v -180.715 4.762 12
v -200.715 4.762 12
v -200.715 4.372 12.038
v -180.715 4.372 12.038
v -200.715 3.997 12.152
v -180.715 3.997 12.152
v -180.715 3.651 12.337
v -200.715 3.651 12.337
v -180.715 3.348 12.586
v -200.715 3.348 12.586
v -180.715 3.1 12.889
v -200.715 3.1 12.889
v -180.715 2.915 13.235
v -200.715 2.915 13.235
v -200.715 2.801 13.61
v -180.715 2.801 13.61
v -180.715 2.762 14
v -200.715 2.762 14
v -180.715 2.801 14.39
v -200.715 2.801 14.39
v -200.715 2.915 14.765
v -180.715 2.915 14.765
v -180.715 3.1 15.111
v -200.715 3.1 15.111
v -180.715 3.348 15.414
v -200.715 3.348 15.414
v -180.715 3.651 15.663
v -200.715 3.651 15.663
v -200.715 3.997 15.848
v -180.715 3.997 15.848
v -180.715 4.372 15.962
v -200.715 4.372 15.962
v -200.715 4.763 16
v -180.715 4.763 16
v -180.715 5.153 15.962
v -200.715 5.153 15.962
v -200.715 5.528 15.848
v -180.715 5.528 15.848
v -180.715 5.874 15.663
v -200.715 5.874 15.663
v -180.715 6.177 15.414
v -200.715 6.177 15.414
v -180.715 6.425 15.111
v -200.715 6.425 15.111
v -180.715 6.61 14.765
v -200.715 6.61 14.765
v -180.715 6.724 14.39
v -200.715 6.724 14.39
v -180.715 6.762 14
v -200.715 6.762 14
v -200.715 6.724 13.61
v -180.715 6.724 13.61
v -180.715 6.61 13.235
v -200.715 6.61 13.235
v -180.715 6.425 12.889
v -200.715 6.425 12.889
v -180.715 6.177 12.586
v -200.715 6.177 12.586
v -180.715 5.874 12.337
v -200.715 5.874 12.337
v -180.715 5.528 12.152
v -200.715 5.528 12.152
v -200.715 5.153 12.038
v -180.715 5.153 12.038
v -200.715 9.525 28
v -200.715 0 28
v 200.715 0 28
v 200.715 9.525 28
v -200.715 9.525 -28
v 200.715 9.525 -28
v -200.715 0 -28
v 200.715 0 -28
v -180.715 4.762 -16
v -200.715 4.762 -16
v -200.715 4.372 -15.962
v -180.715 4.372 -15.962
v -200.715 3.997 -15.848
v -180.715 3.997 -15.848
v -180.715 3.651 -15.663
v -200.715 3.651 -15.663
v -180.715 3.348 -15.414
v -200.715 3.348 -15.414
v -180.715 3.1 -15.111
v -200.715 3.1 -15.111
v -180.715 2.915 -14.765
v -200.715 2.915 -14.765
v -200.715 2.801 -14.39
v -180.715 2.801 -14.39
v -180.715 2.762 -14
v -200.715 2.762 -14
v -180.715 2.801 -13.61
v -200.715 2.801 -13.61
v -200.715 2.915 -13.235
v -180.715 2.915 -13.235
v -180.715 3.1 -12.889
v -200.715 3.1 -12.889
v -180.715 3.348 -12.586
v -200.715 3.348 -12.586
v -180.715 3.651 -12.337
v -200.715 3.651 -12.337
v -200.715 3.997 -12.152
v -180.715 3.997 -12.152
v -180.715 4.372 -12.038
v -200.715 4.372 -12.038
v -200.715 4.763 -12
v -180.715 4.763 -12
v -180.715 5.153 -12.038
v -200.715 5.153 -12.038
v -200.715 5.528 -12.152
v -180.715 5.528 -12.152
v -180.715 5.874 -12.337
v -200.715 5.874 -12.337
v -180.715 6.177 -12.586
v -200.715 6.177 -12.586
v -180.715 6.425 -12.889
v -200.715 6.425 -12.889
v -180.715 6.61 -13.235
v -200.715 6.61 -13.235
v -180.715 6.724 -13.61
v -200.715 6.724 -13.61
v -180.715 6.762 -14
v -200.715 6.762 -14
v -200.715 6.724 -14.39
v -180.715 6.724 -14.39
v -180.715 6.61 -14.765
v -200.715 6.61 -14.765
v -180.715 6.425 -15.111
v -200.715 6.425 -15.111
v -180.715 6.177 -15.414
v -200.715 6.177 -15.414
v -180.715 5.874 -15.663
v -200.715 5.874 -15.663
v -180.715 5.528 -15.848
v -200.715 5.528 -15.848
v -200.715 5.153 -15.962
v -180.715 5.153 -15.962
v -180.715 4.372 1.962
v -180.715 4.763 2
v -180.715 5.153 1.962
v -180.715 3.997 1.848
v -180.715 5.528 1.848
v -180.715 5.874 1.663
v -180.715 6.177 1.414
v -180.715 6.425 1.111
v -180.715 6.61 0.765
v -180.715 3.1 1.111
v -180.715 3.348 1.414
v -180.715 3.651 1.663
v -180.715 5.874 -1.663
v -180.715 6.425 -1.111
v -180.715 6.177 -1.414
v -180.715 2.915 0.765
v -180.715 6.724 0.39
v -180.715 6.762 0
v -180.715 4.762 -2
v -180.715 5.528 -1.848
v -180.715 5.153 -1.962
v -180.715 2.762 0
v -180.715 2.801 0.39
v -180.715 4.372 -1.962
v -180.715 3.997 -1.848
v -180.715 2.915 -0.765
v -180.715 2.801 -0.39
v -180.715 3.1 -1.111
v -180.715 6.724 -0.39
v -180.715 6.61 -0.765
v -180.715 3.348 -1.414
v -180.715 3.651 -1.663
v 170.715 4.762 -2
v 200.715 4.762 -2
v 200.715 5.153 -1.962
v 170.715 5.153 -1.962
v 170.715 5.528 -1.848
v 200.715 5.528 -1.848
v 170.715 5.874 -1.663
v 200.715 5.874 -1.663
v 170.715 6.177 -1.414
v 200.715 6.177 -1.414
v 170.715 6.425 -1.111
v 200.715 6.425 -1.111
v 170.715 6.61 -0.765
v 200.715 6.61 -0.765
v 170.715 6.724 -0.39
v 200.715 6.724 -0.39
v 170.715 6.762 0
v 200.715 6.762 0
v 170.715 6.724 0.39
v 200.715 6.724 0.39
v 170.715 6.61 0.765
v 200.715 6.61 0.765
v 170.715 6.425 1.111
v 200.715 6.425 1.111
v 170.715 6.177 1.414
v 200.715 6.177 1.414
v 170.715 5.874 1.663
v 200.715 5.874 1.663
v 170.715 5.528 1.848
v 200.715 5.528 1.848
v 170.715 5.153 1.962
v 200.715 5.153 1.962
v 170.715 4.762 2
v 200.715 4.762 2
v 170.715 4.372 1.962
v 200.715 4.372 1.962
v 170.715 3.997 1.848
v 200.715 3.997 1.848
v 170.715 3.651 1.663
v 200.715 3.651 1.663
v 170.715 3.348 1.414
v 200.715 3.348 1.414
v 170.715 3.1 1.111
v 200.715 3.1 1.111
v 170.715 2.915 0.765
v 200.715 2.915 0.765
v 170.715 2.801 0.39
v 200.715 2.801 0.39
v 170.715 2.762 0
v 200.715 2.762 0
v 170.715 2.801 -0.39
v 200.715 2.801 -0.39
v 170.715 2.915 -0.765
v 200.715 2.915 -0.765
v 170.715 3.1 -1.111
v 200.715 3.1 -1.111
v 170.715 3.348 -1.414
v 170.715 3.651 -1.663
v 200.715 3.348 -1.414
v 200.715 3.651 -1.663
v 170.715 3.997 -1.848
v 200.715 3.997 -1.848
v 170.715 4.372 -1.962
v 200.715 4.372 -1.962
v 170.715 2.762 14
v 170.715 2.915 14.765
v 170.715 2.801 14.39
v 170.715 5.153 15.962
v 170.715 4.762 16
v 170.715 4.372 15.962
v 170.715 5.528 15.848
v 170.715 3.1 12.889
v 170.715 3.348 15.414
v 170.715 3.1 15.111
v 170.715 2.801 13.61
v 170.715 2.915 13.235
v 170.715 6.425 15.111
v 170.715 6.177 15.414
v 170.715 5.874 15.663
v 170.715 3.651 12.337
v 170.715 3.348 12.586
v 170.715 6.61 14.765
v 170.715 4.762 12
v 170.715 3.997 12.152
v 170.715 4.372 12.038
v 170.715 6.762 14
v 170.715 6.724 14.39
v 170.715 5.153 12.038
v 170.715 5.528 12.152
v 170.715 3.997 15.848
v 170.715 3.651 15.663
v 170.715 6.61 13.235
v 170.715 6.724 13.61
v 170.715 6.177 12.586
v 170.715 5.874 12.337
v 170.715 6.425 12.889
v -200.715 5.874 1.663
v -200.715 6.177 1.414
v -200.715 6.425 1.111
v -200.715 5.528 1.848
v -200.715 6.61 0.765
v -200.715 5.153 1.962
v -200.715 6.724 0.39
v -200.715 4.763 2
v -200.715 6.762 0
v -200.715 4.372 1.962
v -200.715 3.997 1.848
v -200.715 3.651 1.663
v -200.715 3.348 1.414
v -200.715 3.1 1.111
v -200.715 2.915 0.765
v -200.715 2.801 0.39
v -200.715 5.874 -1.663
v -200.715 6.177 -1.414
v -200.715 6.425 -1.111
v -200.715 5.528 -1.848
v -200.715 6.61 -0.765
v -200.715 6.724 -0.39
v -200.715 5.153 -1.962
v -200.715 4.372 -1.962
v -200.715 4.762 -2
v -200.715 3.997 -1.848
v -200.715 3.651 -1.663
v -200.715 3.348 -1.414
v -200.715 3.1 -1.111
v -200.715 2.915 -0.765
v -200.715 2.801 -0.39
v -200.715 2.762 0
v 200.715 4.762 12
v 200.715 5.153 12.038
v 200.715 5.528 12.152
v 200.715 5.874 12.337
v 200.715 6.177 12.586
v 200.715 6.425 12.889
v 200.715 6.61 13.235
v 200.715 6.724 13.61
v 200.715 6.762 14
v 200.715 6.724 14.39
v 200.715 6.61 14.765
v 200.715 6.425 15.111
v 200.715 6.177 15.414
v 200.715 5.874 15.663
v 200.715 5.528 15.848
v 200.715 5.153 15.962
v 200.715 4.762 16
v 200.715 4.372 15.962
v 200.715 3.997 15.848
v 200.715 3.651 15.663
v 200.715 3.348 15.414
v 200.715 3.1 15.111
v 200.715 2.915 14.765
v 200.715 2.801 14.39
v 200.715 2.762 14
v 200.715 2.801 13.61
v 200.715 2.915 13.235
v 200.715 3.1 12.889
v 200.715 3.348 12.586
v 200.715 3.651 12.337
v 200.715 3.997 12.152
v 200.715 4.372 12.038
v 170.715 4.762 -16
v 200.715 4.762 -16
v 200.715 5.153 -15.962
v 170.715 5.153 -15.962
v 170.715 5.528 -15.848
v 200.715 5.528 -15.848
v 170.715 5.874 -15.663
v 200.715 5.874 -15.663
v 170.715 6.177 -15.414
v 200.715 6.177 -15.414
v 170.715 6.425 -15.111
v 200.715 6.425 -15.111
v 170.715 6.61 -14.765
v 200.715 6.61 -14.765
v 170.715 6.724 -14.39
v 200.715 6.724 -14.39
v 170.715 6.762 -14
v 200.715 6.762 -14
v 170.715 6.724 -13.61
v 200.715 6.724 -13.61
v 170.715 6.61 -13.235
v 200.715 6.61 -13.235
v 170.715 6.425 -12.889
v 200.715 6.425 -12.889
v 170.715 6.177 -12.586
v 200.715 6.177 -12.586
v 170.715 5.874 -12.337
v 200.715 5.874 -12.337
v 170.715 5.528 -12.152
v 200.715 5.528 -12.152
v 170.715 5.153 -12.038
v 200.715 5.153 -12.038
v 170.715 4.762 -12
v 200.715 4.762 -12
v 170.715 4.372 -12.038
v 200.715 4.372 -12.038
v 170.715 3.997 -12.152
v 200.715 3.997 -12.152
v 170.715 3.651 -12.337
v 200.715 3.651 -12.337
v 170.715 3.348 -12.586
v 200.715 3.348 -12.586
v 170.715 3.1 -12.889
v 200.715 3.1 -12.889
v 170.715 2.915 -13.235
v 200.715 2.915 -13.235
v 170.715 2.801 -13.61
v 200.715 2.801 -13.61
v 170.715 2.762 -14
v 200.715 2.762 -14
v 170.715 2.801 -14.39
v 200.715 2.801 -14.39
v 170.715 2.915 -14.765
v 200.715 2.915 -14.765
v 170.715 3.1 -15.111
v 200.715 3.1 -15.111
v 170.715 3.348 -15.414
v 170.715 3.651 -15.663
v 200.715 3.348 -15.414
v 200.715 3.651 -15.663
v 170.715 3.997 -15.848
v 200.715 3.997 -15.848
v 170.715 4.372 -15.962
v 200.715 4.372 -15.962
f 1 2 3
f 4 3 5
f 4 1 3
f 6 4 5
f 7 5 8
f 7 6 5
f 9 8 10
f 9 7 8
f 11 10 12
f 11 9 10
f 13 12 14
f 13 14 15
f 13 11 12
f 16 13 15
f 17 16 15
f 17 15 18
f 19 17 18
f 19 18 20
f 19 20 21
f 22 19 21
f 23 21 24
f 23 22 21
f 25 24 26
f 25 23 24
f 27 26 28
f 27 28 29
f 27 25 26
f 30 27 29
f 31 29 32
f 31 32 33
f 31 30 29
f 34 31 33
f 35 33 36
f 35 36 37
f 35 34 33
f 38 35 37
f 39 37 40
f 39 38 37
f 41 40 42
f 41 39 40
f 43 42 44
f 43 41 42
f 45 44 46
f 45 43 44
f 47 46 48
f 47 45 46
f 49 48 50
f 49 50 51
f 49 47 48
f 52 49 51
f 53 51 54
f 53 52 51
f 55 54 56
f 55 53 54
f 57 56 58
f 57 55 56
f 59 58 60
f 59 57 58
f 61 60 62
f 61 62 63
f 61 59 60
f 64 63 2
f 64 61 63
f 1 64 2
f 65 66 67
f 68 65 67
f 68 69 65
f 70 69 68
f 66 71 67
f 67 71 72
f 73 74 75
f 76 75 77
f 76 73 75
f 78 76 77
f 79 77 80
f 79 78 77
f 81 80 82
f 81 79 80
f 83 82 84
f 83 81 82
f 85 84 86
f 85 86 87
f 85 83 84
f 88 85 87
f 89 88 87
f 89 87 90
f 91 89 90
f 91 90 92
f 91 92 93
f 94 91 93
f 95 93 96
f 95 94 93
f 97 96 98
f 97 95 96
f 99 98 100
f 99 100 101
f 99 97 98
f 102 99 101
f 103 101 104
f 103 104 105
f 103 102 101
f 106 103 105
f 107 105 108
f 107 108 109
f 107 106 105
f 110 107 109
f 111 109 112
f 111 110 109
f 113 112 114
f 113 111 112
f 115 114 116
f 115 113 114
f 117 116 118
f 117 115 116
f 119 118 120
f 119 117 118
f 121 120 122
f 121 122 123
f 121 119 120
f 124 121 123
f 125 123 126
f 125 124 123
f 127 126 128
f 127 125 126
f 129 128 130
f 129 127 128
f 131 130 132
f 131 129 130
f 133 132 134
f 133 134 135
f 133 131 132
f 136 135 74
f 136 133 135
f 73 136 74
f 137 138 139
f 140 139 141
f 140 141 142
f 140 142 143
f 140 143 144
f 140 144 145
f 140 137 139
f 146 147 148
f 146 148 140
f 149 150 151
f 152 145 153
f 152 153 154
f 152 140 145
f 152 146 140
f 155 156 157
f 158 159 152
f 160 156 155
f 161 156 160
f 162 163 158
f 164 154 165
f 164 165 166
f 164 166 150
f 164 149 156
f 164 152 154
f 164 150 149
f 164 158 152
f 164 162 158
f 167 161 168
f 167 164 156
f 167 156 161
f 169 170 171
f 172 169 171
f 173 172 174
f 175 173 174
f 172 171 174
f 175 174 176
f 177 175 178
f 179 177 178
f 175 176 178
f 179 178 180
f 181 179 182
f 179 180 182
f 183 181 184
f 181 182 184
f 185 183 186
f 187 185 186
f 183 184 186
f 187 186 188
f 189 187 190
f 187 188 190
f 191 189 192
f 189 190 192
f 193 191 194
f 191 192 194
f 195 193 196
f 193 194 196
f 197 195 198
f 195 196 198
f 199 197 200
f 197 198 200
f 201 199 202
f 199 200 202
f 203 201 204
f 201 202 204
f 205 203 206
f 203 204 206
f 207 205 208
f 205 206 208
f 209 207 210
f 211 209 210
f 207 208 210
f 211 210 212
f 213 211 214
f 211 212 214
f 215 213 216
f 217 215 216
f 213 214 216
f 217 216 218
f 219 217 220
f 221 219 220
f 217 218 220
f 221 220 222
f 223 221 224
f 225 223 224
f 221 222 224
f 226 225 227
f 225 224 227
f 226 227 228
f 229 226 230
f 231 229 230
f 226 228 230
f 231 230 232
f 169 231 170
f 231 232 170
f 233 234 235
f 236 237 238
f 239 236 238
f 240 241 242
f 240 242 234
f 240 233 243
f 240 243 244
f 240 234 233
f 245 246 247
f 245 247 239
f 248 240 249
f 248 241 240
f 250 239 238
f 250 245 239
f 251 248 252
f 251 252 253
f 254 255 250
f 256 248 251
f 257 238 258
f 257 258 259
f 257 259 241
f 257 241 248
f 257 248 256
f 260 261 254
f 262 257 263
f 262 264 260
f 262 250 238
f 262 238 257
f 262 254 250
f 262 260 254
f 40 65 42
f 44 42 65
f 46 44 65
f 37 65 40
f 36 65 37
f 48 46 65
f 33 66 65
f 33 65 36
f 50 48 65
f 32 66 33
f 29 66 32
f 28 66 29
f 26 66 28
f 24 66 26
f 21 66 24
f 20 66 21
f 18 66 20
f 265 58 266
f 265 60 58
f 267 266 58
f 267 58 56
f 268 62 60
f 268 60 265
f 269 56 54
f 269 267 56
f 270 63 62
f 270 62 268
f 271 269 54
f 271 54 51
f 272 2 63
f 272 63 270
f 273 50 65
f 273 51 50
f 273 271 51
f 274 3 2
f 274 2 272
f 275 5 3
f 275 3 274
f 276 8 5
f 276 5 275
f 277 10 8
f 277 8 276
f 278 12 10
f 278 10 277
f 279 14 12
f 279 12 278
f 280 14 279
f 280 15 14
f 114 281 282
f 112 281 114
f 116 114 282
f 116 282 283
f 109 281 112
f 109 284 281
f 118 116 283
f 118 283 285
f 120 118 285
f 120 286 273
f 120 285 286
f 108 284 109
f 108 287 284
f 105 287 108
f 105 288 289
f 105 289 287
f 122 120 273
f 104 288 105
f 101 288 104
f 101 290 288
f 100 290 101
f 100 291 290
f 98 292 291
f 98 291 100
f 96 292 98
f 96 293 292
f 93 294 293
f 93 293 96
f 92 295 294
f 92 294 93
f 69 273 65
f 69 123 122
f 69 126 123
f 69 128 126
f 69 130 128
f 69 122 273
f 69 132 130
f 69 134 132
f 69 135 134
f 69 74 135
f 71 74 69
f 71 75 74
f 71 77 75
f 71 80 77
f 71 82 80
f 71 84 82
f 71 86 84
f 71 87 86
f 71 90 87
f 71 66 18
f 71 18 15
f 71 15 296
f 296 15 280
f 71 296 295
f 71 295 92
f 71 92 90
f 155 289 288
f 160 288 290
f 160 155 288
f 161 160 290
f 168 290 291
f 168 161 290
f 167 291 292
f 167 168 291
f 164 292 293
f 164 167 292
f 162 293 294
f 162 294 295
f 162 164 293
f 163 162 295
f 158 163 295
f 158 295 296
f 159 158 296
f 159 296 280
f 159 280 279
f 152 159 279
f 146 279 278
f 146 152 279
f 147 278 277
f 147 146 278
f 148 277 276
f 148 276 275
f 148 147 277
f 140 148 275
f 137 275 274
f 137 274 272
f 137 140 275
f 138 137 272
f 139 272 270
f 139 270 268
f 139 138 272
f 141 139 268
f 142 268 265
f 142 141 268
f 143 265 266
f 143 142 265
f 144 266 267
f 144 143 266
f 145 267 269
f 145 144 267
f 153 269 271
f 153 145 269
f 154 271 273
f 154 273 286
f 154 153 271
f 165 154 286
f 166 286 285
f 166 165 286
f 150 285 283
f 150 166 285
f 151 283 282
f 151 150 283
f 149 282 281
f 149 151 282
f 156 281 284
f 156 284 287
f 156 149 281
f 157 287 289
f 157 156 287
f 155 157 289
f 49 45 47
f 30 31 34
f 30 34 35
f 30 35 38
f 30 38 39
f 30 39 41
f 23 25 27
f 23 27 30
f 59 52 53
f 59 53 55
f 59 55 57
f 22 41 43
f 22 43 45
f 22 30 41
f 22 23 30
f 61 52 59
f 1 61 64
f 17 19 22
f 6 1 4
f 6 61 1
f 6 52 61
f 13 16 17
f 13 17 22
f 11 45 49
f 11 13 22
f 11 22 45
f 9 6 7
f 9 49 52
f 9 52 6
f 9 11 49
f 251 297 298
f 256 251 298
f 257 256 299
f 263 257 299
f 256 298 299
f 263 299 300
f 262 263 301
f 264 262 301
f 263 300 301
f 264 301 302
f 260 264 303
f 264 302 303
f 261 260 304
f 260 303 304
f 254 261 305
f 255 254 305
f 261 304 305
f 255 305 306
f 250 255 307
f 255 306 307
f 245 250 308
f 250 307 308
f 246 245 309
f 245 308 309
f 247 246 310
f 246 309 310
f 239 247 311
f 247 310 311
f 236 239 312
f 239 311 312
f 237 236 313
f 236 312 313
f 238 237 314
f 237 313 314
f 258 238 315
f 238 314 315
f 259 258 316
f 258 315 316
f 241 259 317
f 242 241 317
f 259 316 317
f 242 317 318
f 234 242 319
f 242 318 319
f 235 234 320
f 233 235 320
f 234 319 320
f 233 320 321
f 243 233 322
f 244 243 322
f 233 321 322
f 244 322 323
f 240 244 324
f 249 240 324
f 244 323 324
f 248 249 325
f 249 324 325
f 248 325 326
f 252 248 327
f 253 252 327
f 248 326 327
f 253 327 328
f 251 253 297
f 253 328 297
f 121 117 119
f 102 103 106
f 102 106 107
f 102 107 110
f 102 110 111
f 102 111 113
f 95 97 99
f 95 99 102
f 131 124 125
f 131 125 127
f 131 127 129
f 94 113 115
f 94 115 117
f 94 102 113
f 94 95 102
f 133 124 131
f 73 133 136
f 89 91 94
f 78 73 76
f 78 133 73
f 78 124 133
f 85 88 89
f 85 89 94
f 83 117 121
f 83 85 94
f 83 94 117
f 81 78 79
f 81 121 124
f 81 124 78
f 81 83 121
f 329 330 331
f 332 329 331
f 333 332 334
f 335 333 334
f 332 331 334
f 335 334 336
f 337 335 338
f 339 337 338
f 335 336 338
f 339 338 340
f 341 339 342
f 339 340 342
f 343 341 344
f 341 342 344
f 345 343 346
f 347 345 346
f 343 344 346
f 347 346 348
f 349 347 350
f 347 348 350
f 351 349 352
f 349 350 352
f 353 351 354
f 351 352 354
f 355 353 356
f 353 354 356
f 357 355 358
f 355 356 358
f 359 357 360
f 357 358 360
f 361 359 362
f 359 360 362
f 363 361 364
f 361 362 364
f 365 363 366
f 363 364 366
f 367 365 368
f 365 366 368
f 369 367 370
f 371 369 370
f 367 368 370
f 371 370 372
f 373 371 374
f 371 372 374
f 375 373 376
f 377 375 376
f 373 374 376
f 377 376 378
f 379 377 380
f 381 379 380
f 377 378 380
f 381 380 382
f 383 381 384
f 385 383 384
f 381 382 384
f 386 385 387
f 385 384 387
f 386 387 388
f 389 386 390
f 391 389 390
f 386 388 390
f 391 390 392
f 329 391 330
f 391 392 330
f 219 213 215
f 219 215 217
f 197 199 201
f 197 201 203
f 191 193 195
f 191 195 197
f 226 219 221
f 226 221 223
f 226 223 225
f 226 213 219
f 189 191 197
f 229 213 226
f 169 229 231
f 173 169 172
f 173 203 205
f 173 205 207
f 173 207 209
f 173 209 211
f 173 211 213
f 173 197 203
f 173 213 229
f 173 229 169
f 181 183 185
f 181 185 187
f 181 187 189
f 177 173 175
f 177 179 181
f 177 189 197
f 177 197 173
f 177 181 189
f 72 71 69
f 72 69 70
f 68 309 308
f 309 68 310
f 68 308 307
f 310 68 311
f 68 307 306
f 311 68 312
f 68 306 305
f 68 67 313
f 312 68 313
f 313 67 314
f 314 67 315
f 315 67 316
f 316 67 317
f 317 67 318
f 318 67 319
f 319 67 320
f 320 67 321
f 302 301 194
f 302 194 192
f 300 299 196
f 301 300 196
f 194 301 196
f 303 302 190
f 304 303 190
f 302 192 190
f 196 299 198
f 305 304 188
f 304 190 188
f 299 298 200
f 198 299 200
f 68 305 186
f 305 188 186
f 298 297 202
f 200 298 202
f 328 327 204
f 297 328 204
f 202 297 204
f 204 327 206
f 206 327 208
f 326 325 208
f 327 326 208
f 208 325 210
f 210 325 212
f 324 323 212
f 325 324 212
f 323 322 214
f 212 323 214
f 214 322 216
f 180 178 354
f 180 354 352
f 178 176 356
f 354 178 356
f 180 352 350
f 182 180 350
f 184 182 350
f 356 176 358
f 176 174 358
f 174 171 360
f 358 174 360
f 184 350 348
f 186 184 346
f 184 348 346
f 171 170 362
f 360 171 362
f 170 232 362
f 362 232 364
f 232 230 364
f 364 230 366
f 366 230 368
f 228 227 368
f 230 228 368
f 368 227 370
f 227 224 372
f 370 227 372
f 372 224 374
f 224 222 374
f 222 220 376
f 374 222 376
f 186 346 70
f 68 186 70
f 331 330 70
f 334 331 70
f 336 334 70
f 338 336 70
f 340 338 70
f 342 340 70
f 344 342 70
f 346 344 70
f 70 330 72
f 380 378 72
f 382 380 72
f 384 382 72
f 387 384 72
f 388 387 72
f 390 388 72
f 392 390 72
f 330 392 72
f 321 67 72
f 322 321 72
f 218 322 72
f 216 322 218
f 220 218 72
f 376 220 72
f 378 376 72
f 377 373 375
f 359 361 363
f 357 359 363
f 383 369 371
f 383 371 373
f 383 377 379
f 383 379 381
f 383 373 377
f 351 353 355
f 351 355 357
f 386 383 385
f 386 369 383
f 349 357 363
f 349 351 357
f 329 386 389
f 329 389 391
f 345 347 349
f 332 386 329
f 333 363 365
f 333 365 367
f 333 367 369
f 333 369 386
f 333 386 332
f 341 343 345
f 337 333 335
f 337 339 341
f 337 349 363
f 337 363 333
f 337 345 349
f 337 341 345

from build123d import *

# Parameters (mm, degrees)
ESBO_O1_W                = 401.43
ESBO_O1_H                = 56
RESSALTO_EXTRUS_O1_DEPTH = 9.525
ESBO_O2_R                = 2
CORTE_EXTRUS_O1_DEPTH    = 30
CORTE_EXTRUS_O2_START    = -20
ESBO_O3_R                = 2
CORTE_EXTRUS_O2_DEPTH    = 20


with BuildPart() as part:
    # Esboço1 → Ressalto-extrusão1 (new body)
    with BuildSketch(Plane(origin=(0, 0, 0), x_dir=(1, 0, 0), z_dir=(0, 1, 0))):
        Rectangle(ESBO_O1_W, ESBO_O1_H)
    extrude(amount=RESSALTO_EXTRUS_O1_DEPTH)

    # Esboço2 → Corte-extrusão1 (cut)
    with BuildSketch(Plane(origin=(200.715, 0, 0), x_dir=(0, 0, -1), z_dir=(1, 0, 0))):
        with Locations((-14, 4.7625)):
            Circle(ESBO_O2_R)
        with Locations((0, 4.7625)):
            Circle(ESBO_O2_R)
        with Locations((14, 4.7625)):
            Circle(ESBO_O2_R)
    extrude(amount=-CORTE_EXTRUS_O1_DEPTH, mode=Mode.SUBTRACT)

    # Esboço3 → Corte-extrusão2 (cut)
    with BuildSketch(Plane.ZY.offset(200.715).offset(CORTE_EXTRUS_O2_START)):
        with Locations(Location((-14, 4.7625, 0), (0, 0, 180))):
            Circle(ESBO_O3_R)
        with Locations(Location((0, 4.7625, 0), (0, 0, 180))):
            Circle(ESBO_O3_R)
        with Locations(Location((14, 4.7625, 0), (0, 0, 180))):
            Circle(ESBO_O3_R)
    extrude(amount=CORTE_EXTRUS_O2_DEPTH, mode=Mode.SUBTRACT)


solid = part.part
